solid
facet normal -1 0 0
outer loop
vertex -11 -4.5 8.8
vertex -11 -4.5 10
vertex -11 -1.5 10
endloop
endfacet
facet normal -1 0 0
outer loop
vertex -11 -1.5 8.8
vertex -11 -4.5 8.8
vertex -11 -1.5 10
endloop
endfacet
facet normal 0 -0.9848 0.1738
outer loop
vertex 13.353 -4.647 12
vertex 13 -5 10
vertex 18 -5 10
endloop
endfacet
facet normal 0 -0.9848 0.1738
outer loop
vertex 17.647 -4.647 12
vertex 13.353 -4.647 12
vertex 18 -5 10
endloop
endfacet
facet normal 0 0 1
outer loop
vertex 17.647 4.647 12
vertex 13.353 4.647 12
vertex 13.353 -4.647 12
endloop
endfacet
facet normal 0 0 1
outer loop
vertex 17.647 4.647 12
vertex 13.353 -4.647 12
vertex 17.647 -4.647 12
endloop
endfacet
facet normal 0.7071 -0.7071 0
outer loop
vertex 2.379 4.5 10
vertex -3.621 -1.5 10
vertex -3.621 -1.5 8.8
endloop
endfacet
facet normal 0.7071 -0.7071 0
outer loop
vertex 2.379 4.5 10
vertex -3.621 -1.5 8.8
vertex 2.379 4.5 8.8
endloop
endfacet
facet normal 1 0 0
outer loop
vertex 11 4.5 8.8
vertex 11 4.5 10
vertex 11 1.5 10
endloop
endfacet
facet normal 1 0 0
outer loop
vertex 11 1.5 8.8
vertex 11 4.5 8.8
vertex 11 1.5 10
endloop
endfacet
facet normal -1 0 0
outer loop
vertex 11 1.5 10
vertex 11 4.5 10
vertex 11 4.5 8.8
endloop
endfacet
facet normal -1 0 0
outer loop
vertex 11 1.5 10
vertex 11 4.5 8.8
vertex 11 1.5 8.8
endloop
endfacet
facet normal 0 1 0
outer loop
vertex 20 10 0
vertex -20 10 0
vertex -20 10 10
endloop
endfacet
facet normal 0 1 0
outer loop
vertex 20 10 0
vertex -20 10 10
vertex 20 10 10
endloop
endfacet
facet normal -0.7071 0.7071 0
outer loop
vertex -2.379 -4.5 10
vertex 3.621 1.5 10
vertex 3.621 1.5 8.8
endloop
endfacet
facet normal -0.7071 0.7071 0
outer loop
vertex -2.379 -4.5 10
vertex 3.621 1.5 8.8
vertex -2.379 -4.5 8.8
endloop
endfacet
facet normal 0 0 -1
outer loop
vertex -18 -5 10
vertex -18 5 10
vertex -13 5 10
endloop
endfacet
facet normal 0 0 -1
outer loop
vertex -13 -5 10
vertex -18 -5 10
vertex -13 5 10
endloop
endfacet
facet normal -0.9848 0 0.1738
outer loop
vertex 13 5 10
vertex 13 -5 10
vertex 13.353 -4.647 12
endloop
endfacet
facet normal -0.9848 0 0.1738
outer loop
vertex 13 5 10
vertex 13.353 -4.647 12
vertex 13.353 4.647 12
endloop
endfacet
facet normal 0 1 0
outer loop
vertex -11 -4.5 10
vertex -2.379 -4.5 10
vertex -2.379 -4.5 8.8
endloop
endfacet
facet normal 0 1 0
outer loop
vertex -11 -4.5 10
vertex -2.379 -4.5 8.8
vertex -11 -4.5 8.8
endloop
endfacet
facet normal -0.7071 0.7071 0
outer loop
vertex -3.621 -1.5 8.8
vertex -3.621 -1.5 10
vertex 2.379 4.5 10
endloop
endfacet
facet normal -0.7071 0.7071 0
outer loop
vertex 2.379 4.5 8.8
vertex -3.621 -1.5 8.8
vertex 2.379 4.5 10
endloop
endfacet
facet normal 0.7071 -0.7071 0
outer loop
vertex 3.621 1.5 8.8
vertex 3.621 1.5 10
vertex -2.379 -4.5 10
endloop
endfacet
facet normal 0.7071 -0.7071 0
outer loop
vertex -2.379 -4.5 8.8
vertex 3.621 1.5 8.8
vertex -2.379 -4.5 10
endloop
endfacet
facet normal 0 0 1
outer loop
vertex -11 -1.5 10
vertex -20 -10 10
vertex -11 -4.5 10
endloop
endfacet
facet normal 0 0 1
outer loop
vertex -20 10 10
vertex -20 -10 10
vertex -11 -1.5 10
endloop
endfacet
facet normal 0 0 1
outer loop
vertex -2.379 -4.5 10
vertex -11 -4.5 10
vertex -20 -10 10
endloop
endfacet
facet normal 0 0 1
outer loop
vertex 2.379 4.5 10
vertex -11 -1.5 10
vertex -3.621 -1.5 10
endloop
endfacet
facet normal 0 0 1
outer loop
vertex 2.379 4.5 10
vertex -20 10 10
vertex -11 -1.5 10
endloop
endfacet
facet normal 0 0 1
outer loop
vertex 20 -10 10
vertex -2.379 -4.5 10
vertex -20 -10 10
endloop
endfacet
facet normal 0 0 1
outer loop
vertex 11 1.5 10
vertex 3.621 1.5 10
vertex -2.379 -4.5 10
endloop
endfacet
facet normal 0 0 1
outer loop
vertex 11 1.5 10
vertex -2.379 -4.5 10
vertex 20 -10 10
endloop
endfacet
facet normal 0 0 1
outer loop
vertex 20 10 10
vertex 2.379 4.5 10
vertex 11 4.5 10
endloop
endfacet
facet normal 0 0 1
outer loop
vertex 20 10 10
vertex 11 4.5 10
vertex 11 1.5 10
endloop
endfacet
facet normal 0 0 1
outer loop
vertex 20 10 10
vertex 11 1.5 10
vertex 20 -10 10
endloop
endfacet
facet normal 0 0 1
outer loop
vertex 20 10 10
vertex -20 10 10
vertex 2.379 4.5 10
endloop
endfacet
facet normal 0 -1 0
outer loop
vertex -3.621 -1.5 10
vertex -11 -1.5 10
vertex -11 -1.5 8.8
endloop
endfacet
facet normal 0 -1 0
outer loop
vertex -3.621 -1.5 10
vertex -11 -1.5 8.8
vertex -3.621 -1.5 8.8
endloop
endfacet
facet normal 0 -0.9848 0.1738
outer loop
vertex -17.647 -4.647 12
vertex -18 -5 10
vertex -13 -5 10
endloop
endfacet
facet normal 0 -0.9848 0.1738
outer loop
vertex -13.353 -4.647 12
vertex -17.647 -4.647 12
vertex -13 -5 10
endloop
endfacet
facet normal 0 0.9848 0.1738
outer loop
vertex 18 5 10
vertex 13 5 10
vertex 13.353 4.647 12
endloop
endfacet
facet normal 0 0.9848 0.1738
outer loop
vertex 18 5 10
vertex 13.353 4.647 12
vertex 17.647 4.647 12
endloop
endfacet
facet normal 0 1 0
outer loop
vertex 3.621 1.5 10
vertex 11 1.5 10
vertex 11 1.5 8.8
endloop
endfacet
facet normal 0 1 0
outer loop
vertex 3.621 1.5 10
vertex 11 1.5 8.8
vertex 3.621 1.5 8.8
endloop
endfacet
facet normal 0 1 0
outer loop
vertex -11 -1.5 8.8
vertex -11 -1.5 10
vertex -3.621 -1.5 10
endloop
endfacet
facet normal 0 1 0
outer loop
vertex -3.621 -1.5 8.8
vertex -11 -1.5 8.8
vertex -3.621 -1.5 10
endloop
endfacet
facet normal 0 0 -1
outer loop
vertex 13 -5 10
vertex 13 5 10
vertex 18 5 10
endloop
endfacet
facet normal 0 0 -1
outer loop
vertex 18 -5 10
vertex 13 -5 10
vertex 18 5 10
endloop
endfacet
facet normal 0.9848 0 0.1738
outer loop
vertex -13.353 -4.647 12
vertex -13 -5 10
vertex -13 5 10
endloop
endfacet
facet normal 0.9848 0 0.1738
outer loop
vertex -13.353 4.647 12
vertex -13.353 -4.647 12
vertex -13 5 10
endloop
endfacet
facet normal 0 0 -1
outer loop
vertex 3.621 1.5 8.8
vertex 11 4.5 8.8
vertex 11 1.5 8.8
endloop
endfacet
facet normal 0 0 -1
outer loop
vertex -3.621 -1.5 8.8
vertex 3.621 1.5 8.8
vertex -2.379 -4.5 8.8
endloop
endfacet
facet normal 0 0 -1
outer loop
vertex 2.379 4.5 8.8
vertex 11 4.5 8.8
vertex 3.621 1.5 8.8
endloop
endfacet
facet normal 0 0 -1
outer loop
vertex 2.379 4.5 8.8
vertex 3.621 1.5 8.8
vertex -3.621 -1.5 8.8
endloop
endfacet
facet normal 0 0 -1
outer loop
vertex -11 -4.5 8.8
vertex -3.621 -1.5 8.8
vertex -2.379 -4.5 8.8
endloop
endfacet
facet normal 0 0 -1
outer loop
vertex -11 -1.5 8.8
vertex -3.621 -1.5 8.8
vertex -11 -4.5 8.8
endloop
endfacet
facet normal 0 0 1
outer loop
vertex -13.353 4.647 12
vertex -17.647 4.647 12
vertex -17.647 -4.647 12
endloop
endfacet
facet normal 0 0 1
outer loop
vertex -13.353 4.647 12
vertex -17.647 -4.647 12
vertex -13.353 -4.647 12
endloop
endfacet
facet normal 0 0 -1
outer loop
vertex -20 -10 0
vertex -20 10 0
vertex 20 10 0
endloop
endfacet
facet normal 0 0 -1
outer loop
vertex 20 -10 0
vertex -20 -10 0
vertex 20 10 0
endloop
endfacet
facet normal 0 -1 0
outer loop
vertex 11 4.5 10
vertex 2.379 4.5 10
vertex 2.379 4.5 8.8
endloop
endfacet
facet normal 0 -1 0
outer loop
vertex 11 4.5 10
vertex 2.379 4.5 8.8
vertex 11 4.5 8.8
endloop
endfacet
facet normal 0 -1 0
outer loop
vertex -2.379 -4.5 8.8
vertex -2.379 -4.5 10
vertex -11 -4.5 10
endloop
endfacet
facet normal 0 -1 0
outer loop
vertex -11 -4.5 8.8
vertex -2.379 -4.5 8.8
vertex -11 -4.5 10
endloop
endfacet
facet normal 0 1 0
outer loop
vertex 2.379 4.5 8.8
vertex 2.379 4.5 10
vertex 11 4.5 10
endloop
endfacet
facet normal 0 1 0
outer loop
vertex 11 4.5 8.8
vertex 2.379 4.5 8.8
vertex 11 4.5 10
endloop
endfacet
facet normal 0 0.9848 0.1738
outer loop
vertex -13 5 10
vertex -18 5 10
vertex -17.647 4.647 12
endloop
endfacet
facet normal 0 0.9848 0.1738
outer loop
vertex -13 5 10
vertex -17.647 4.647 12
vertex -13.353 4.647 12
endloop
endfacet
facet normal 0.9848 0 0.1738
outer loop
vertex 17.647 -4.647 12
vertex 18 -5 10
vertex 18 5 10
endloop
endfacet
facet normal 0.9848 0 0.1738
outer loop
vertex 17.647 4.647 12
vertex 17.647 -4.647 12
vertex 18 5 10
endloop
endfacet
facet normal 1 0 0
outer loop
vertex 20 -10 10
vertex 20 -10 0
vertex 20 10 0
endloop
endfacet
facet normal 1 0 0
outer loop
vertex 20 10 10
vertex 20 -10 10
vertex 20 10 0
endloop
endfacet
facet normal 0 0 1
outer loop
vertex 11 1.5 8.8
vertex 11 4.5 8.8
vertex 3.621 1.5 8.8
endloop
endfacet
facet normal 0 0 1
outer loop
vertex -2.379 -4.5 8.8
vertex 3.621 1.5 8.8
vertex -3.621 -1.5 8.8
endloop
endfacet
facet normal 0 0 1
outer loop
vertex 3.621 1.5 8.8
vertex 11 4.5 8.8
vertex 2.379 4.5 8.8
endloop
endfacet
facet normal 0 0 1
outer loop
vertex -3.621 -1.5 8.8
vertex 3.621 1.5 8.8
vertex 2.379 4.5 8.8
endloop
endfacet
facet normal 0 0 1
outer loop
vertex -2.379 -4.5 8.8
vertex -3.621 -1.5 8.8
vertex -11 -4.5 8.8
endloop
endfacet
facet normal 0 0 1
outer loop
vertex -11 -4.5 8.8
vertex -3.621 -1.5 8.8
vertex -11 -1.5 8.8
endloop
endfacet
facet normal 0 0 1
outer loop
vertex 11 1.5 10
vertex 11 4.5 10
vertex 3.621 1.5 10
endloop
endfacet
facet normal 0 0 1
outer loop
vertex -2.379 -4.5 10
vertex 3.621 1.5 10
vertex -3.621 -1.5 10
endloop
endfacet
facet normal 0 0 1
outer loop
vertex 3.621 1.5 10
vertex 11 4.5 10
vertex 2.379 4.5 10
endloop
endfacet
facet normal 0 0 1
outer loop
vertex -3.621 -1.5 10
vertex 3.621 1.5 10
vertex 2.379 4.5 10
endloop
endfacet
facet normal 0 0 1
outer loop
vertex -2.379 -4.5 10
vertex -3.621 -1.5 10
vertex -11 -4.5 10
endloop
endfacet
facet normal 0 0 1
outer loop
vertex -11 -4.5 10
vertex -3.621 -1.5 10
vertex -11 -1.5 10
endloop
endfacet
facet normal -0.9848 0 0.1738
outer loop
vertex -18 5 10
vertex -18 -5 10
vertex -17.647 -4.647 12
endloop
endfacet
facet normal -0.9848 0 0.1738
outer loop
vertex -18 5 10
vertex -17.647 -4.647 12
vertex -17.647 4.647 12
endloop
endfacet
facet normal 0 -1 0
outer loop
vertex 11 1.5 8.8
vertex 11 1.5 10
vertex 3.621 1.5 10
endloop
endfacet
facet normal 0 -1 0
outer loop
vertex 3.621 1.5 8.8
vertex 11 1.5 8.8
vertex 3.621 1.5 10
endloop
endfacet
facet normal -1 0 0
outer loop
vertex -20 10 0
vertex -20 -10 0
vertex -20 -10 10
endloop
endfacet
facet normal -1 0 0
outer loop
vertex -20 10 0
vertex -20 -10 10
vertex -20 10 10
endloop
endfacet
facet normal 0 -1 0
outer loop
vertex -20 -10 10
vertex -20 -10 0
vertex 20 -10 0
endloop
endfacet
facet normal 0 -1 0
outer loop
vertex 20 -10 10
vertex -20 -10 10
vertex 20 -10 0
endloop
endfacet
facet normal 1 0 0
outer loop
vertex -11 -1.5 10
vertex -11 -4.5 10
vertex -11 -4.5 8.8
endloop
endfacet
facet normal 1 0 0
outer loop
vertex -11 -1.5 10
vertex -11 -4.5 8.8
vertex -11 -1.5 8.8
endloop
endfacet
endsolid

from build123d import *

# Parameters (mm, degrees)
SKETCH1_W                     = 40
SKETCH1_H                     = 20
BOSS_EXTRUDE1_DEPTH           = 10
CUT_EXTRUDE1_DEPTH            = 1.2
BOSS_EXTRUDE2_DEPTH           = 1.2
SKETCH3_W                     = 5
SKETCH3_H                     = 10
BOSS_EXTRUDE3_DEPTH           = 2
BOSS_EXTRUDE3_DRAFT           = 10
BOSS_EXTRUDE3_PROFILE_2_DEPTH = 2
BOSS_EXTRUDE3_PROFILE_2_DRAFT = 10


with BuildPart() as part:
    # Sketch1 → Boss-Extrude1 (new body)
    with BuildSketch(Plane.XY):
        Rectangle(SKETCH1_W, SKETCH1_H)
    extrude(amount=BOSS_EXTRUDE1_DEPTH)

    # Sketch2 → Cut-Extrude1 (cut)
    with BuildSketch(Plane.XY.offset(10)):
        Polygon((-3.621320344, -1.5), (2.378679656, 4.5), (11, 4.5), (11, 1.5), (3.621320344, 1.5), (-2.378679656, -4.5), (-11, -4.5), (-11, -1.5), align=None)
    extrude(amount=-CUT_EXTRUDE1_DEPTH, mode=Mode.SUBTRACT)


with BuildPart() as body_2:
    # Sketch2<2> → Boss-Extrude2 (new body)
    with BuildSketch(Plane.XY.offset(10)):
        Polygon((-3.621320344, -1.5), (2.378679656, 4.5), (11, 4.5), (11, 1.5), (3.621320344, 1.5), (-2.378679656, -4.5), (-11, -4.5), (-11, -1.5), align=None)
    extrude(amount=-BOSS_EXTRUDE2_DEPTH)


with BuildPart() as body_3:
    # Sketch3 → Boss-Extrude3 (with draft: the straight prism first)
    with BuildSketch(Plane.XY.offset(10)):
        with Locations((-15.5, 0)):
            Rectangle(SKETCH3_W, SKETCH3_H)
    extrude(amount=BOSS_EXTRUDE3_DEPTH)
    # Boss-Extrude3: the draft: its side faces are tilted about the plane it starts from
    boss_extrude3_sides = [body_3.faces().sort_by_distance(p)[0] for p in [
        (-15.5, -5, 11),
        (-13, 0, 11),
        (-15.5, 5, 11),
        (-18, 0, 11),
    ]]
    draft(boss_extrude3_sides, Plane.XY.offset(10), BOSS_EXTRUDE3_DRAFT)


with BuildPart() as body_4:
    # Sketch3 → Boss-Extrude3 profile 2 (with draft: the straight prism first)
    with BuildSketch(Plane.XY.offset(10)):
        with Locations((15.5, 0)):
            Rectangle(SKETCH3_W, SKETCH3_H)
    extrude(amount=BOSS_EXTRUDE3_PROFILE_2_DEPTH)
    # Boss-Extrude3 profile 2: the draft: its side faces are tilted about the plane it starts from
    boss_extrude3_profile_2_sides = [body_4.faces().sort_by_distance(p)[0] for p in [
        (15.5, -5, 11),
        (18, 0, 11),
        (15.5, 5, 11),
        (13, 0, 11),
    ]]
    draft(boss_extrude3_profile_2_sides, Plane.XY.offset(10), BOSS_EXTRUDE3_PROFILE_2_DRAFT)


solid = Compound([part.part, body_2.part, body_3.part, body_4.part])
